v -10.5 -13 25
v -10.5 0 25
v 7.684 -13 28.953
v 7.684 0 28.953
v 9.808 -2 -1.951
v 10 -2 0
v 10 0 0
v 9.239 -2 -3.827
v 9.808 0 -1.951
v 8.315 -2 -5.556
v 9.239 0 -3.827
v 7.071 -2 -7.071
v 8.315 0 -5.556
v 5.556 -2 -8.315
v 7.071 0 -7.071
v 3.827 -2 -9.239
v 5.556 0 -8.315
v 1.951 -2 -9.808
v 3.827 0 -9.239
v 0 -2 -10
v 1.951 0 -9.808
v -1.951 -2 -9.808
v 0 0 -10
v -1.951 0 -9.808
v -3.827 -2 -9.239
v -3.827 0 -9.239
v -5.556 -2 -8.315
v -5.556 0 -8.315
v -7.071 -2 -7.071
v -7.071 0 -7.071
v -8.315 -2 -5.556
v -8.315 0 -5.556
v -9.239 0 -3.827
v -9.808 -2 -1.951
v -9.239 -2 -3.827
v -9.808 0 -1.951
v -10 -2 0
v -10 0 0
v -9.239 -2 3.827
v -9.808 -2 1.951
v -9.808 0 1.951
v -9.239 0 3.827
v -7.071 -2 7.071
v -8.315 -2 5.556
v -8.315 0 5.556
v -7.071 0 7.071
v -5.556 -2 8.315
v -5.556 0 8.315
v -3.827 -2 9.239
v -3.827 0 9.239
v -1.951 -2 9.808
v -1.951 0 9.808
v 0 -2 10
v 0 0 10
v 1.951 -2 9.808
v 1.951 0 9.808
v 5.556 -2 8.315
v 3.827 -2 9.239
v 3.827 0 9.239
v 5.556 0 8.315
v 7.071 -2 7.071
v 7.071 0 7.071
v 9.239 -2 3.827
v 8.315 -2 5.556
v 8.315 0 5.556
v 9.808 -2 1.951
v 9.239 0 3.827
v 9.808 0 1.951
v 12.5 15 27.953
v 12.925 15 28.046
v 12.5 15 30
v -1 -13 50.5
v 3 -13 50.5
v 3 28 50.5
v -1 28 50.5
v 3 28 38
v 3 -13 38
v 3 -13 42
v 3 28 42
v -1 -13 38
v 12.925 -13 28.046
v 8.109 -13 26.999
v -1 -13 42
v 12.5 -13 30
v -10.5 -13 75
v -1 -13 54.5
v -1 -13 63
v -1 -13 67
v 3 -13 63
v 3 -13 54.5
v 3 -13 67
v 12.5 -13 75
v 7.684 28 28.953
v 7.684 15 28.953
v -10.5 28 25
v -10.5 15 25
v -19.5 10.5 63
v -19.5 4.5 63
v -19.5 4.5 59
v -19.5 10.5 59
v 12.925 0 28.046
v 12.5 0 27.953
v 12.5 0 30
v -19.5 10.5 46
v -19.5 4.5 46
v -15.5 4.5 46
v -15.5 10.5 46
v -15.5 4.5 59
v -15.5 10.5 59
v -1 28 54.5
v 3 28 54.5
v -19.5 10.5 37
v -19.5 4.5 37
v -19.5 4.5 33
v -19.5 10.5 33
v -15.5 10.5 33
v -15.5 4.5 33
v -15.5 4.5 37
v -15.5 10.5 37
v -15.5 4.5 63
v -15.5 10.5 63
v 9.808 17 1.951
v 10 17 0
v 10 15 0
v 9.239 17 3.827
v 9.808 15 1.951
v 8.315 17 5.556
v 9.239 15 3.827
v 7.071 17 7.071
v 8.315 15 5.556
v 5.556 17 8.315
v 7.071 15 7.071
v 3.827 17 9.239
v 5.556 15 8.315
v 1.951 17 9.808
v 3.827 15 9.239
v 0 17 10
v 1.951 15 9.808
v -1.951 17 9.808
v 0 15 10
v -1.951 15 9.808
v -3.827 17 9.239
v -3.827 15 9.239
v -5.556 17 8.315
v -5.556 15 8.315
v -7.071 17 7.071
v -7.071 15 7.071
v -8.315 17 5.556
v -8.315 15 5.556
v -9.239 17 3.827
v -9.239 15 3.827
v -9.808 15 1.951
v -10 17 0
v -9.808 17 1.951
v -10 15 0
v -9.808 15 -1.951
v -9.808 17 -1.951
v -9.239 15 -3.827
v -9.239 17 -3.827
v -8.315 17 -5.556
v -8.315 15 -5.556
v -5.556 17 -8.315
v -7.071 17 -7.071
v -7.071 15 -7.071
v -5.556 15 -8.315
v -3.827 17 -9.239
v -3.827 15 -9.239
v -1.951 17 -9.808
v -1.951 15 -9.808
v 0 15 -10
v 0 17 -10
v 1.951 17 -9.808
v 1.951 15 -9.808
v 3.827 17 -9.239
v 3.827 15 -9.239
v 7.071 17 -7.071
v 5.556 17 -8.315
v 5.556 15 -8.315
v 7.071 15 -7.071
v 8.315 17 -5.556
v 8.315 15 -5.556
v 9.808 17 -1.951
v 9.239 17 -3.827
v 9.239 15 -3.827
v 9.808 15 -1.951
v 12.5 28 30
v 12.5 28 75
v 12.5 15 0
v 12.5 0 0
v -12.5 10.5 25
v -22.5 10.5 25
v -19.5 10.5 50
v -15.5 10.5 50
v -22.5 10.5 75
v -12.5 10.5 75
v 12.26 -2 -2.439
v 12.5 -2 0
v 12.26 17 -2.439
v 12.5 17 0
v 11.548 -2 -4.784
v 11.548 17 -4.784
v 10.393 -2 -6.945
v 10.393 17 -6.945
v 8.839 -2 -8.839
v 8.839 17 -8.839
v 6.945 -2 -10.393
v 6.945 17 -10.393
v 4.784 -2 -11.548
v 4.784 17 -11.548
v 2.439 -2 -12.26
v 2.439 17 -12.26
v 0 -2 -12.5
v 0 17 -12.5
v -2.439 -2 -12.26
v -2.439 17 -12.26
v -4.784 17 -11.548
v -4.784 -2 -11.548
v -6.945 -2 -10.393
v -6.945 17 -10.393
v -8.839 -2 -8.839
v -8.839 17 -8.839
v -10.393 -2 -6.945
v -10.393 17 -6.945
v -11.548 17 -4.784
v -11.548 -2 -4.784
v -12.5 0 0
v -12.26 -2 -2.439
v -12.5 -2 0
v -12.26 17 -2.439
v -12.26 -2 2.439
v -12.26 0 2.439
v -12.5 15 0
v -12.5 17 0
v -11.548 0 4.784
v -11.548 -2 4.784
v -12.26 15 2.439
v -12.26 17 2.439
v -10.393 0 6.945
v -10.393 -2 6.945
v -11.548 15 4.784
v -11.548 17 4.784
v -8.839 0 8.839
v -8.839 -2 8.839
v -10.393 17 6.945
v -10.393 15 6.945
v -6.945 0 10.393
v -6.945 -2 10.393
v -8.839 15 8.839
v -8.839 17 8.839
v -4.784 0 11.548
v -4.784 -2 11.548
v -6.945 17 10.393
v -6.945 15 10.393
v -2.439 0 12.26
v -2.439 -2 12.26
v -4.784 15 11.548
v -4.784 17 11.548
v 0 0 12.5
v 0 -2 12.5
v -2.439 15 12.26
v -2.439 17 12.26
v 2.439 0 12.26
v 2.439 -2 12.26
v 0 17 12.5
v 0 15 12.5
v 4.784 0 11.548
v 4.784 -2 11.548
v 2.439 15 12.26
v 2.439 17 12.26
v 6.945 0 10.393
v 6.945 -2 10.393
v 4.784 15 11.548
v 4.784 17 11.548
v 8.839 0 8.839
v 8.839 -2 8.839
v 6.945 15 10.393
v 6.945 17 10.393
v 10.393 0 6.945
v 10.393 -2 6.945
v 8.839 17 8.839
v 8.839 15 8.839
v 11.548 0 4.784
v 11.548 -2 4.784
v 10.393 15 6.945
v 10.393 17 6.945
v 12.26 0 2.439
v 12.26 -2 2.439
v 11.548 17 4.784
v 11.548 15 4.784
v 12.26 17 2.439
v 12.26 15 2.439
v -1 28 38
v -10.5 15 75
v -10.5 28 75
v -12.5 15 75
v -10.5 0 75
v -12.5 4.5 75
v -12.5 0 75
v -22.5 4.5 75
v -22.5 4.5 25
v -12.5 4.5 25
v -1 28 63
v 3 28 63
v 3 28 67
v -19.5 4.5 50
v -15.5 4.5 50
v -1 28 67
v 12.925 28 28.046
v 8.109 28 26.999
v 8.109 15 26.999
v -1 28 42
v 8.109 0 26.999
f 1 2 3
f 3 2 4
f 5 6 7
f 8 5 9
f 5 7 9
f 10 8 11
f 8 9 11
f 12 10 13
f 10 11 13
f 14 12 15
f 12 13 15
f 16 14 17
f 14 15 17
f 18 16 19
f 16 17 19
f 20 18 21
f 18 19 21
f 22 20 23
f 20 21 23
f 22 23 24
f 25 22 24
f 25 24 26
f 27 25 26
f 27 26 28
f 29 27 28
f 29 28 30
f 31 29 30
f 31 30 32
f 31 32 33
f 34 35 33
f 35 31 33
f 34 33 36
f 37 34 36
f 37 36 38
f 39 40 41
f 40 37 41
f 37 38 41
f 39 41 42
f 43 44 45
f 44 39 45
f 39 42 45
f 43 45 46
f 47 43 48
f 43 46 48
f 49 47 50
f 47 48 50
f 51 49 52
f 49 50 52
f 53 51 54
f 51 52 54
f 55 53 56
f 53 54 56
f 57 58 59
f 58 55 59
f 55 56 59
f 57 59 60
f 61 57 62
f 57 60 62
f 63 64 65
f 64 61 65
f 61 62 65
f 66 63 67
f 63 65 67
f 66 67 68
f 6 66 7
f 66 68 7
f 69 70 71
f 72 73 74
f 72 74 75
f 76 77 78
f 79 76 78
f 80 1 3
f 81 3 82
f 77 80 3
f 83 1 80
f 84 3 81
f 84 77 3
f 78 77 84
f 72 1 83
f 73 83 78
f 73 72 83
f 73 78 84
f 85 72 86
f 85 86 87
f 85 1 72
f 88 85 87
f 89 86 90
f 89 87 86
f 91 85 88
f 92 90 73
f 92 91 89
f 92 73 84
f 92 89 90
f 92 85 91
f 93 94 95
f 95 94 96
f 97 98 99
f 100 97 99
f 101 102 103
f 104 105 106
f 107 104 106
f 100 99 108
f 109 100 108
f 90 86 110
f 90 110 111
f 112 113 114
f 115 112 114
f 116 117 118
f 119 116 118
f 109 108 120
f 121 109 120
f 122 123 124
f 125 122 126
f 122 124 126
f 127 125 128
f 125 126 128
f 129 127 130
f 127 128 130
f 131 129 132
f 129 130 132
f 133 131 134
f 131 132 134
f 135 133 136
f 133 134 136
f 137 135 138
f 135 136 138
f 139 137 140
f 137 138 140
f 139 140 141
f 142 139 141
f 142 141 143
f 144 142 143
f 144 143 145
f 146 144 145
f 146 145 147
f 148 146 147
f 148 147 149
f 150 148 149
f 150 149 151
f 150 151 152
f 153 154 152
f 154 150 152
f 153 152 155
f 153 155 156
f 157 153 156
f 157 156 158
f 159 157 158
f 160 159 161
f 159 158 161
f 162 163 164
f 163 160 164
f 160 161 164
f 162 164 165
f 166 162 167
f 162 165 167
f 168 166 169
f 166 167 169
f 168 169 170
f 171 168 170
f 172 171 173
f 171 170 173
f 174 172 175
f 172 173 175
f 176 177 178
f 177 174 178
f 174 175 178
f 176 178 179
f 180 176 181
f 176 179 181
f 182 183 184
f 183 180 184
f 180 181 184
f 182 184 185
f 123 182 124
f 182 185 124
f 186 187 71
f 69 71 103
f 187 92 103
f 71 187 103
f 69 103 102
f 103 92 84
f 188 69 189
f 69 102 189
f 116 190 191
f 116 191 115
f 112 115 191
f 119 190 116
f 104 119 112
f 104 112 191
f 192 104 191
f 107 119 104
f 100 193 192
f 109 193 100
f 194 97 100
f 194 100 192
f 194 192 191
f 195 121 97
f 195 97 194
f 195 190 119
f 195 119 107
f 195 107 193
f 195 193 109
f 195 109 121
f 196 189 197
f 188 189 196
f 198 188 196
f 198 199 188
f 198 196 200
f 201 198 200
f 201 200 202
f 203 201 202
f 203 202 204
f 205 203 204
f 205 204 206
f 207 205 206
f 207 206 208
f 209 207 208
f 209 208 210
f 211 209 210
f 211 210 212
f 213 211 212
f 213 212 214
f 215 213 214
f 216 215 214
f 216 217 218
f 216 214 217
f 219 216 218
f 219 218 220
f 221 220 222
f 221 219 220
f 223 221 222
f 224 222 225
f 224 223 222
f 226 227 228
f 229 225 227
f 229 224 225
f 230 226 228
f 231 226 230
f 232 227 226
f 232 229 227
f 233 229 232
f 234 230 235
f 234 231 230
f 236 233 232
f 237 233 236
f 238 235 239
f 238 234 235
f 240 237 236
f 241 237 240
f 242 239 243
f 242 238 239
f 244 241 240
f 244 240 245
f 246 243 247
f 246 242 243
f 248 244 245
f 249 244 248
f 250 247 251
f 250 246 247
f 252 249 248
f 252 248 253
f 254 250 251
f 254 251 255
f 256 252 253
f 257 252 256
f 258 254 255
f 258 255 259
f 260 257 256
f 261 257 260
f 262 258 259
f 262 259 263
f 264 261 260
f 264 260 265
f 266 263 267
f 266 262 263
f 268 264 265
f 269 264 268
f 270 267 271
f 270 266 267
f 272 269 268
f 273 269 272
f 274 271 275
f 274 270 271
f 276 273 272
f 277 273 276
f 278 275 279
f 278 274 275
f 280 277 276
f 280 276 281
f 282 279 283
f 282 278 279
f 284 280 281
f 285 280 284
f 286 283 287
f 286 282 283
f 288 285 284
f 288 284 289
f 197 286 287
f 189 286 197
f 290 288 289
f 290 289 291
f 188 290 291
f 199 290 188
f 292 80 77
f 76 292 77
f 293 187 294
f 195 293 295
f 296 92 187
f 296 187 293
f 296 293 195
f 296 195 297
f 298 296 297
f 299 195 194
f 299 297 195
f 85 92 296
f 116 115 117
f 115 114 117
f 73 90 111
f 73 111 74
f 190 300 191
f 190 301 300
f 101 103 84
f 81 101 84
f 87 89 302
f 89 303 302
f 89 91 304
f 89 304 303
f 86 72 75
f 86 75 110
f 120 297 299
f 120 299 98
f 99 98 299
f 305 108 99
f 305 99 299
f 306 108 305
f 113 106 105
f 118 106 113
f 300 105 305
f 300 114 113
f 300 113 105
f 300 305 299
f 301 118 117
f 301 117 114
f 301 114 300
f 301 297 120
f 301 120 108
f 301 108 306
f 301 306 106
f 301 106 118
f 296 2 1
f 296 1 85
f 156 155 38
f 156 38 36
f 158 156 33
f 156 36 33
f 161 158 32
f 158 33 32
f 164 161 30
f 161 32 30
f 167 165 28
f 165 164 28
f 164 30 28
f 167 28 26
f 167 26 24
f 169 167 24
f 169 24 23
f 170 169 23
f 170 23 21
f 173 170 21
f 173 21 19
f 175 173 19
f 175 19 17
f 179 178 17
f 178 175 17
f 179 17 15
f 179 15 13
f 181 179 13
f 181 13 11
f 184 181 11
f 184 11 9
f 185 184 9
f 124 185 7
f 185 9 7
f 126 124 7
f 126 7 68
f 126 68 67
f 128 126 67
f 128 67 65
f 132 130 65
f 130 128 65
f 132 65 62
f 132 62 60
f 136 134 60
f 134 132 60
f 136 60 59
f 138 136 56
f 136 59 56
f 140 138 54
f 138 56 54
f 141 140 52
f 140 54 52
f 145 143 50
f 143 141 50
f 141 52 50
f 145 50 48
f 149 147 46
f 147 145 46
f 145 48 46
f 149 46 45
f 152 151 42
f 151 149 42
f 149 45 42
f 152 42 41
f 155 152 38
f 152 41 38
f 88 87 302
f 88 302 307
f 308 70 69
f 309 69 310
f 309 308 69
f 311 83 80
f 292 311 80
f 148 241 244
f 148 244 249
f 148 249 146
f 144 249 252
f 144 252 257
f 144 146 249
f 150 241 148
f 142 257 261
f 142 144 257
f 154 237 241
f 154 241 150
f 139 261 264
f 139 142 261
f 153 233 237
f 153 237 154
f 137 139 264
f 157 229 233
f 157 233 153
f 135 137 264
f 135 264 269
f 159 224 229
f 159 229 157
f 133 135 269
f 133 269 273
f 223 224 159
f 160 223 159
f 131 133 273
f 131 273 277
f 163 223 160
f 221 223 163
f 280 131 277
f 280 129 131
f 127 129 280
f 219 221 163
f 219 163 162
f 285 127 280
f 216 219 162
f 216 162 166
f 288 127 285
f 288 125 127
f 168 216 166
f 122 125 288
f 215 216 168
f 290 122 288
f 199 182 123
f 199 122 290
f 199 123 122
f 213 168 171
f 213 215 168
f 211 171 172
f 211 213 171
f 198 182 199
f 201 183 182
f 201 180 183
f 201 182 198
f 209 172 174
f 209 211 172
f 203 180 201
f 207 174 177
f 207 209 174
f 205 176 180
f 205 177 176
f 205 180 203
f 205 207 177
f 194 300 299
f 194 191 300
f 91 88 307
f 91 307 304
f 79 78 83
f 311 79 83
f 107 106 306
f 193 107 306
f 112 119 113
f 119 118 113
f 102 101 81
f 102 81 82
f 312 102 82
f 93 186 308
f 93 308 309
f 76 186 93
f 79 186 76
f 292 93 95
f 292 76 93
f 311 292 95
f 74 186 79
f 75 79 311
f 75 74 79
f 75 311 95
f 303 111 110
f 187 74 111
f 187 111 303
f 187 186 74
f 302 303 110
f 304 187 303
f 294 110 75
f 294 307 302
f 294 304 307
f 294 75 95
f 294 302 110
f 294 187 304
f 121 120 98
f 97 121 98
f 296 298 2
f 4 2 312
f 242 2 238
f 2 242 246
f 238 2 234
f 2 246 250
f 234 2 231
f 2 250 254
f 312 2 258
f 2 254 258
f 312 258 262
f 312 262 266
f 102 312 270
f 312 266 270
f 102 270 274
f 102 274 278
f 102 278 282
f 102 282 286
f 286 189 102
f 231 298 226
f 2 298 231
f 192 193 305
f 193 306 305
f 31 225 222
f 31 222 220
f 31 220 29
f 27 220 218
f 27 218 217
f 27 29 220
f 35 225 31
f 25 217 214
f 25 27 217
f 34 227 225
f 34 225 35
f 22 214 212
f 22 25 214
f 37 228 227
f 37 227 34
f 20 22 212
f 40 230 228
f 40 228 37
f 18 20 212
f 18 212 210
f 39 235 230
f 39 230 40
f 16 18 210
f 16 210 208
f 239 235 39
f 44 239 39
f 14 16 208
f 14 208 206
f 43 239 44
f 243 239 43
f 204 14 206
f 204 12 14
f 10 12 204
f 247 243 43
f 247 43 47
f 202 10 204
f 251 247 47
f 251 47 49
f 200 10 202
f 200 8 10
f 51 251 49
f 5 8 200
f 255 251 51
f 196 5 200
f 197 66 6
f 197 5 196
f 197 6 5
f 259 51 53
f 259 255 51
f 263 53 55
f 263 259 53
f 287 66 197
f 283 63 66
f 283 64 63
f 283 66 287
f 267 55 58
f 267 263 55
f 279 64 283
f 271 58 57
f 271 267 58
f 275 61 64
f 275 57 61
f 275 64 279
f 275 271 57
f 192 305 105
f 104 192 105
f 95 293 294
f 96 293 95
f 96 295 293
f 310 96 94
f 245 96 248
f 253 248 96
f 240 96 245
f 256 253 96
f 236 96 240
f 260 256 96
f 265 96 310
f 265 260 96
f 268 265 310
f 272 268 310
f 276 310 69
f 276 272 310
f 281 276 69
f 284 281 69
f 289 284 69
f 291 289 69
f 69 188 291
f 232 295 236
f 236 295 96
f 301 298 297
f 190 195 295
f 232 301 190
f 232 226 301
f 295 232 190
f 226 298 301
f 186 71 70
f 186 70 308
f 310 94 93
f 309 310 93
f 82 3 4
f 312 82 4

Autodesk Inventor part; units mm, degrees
ref_plane "YZ Plane" through (0, 0, 0) normal (1, 0, 0) x (0, 1, 0)
ref_plane "XY Plane" through (0, 0, 0) normal (0, 0, 1) x (1, 0, 0)
sketch "Sketch1" plane through (0, 0, 0) normal (0, 1, 0) x (-1, 0, 0)
  circle A0 centre (0, 0) radius 10
  circle A1 centre (0, 0) radius 12.5
  line L0 (12.5, 0) -> (12.5, 50)
  line L1 (-12.5, 0) -> (-12.5, 50)
  line L2 (-12.5, 50) -> (12.5, 50)
  dimension "d0" = 20
  dimension "d1" = 25
  dimension "d2" = 50
extrude "Extrusion1" add sketch "Sketch1" along normal blind 15
sketch "Sketch2" plane through (-12.5, 0, 0) normal (-1, 0, 0) x (0, 0, 1)
  line L0 (-12.5, 0) -> (-12.5, 15) projected
  line L1 (-12.5, 7.5) -> (37.5, 7.5)
  line L2 (25, 7.5) -> (25, 4.5)
  line L3 (25, 4.5) -> (25, 10.5)
  line L4 (25, 10.5) -> (75, 10.5)
  line L5 (75, 10.5) -> (75, 4.5)
  line L6 (75, 4.5) -> (25, 4.5)
  point P0 (0, 0)
  dimension "d5" = 50
  dimension "d8" = 3
  dimension "d9" = 6
  dimension "d10" = 50
extrude "Extrusion2" add sketch "Sketch2" along normal blind 10
sketch "Sketch3" plane through (-12.5, 0, 50) normal (0, 0, 1) x (1, 0, 0)
  point P0 (12.5, 0)
sketch "Sketch4" plane through (-12.5, 0, 50) normal (0, 0, 1) x (1, 0, 0)
  line L0 (25, 0) -> (25, 15) projected
  line L1 (25, 0) -> (25, 15)
  line L2 (0, 15) -> (25, 15) projected
  line L3 (25, 15) -> (0, 15)
  line L4 (0, 0) -> (0, 15) projected
  line L5 (0, 15) -> (0, 0)
  line L6 (0, 0) -> (25, 0) projected
  line L7 (0, 0) -> (25, 0)
  point P0 (12.5, 0)
extrude "Extrusion3" add sketch "Sketch4" along normal blind 25
sketch "Sketch5" plane through (-12.5, 4.5, 25) normal (0, -1, 0) x (1, 0, 0)
  point P0 (12.5, -25)
sketch "Sketch8" plane through (-12.5, 4.5, 25) normal (0, -1, 0) x (1, 0, 0)
  line L0 (0, 0) -> (-10, 0) projected
  line L1 (-5, 0) -> (-5, 50)
  line L2 (0, 50) -> (-10, 50) projected
  line L3 (-3, 12) -> (-7, 12)
  line L4 (-7, 12) -> (-7, 8)
  line L5 (-7, 8) -> (-3, 8)
  line L6 (-3, 8) -> (-3, 12)
  line L7 (-3, 12) -> (-7, 8) construction
  line L8 (-7, 12) -> (-3, 8) construction
  line L9 (-5, 10) -> (-5, 23)
  line L10 (-7, 21) -> (-3, 21)
  line L11 (-3, 21) -> (-3, 25)
  line L12 (-3, 25) -> (-7, 25)
  line L13 (-7, 25) -> (-7, 21)
  line L14 (-7, 21) -> (-3, 25) construction
  line L15 (-3, 21) -> (-7, 25) construction
  line L16 (-5, 23) -> (-5, 36)
  line L17 (-7, 34) -> (-3, 34)
  line L18 (-3, 34) -> (-3, 38)
  line L19 (-3, 38) -> (-7, 38)
  line L20 (-7, 38) -> (-7, 34)
  line L21 (-7, 34) -> (-3, 38) construction
  line L22 (-3, 34) -> (-7, 38) construction
  point P0 (12.5, -25)
  dimension "d40" = 4
  dimension "d41" = 4
  dimension "d42" = 13
  dimension "d43" = 4
  dimension "d44" = 4
  dimension "d45" = 13
  dimension "d46" = 4
  dimension "d47" = 4
extrude "Extrusion6" cut sketch "Sketch8" against normal blind 10
sketch "Sketch9" plane through (0, 0, 0) normal (0, -1, 0) x (1, 0, 0)
  line L0 (-12.5, 25) -> (-22.5, 25) projected
  line L1 (-12.5, 25) -> (12.5, 25)
  line L2 (12.5, 0) -> (12.5, 75) projected
  line L3 (-12.5, 25) -> (-12.5, 75) projected
  line L4 (-12.5, 25) -> (-12.5, 75)
  line L5 (-12.5, 75) -> (12.5, 75) projected
  line L6 (-12.5, 75) -> (12.5, 75)
  line L7 (12.5, 75) -> (12.5, 25)
  line L8 (12.5, 0) -> (12.5, 30)
  line L9 (-12.5, 25) -> (-10.5, 25)
  line L10 (-10.5, 25) -> (-10.5, 75)
  line L11 (-12.5, 75) -> (-12.5, 25)
  line L12 (-10.5, 25) -> (12.5, 30)
  point P0 (0, 0)
  dimension "d50" = 30
  dimension "d51" = 2
extrude "Extrusion7" add sketch "Sketch9" along normal blind 13 contours L10 L5 L2 L12
sketch "Sketch10" plane through (0, -13, 0) normal (0, -1, 0) x (1, 0, 0)
  point P0 (0, 0)
sketch "Sketch11" plane through (0, -13, 0) normal (0, -1, 0) x (1, 0, 0)
  line L0 (-10.5, 25) -> (12.5, 30) projected
  line L1 (12.5, 30) -> (-10.5, 30)
  line L2 (-10.5, 25) -> (-10.5, 75) projected
  line L3 (-10.5, 30) -> (1, 30)
  line L4 (1, 30) -> (1, 75)
  line L5 (12.5, 75) -> (-12.5, 75) projected
  line L6 (-1, 42) -> (3, 42)
  line L7 (3, 42) -> (3, 38)
  line L8 (3, 38) -> (-1, 38)
  line L9 (-1, 38) -> (-1, 42)
  line L10 (-1, 42) -> (3, 38) construction
  line L11 (3, 42) -> (-1, 38) construction
  line L12 (1, 40) -> (1, 52.5)
  line L13 (-1, 50.5) -> (3, 50.5)
  line L14 (3, 50.5) -> (3, 54.5)
  line L15 (3, 54.5) -> (-1, 54.5)
  line L16 (-1, 54.5) -> (-1, 50.5)
  line L17 (-1, 50.5) -> (3, 54.5) construction
  line L18 (3, 50.5) -> (-1, 54.5) construction
  line L19 (1, 52.5) -> (1, 65)
  line L20 (-1, 63) -> (3, 63)
  line L21 (3, 63) -> (3, 67)
  line L22 (3, 67) -> (-1, 67)
  line L23 (-1, 67) -> (-1, 63)
  line L24 (-1, 63) -> (3, 67) construction
  line L25 (3, 63) -> (-1, 67) construction
  line L26 (-1, 38) -> (-1, 42)
  line L27 (-1, 38) -> (3, 38)
  line L28 (3, 38) -> (3, 42)
  line L29 (3, 42) -> (-1, 42)
  line L30 (-1, 42) -> (-1, 38)
  line L31 (-1, 38) -> (3, 42) construction
  line L32 (3, 38) -> (-1, 42) construction
  point P0 (0, 0)
  dimension "d54" = 11.5
  dimension "d55" = 4
  dimension "d56" = 4
  dimension "d57" = 12.5
  dimension "d58" = 4
  dimension "d59" = 4
  dimension "d60" = 12.5
  dimension "d61" = 4
  dimension "d62" = 4
extrude "Extrusion8" cut sketch "Sketch11" against normal blind 50 contours L8 L9 L6 L4 | L4 L6 L7 L8 | L22 L21 L20 L4 | L4 L20 L23 L22 | L13 L16 L15 L4 | L4 L15 L14 L13
ref_plane "Work Plane1" through (0, 7.5, 0) normal (0, 1, 0) x (-1, 0, 0)
mirror "Mirror1" about plane through (0, 7.5, 0) normal (0, 1, 0) of "Extrusion7"
mirror "Mirror2" about plane through (0, 7.5, 0) normal (0, 1, 0) of "Extrusion8"
sketch "Sketch12" plane through (-22.5, 0, 0) normal (-1, 0, 0) x (0, 0, 1)
  point P0 (0, 0)
sketch "Sketch13" plane through (-12.5, 4.5, 25) normal (0, -1, 0) x (1, 0, 0)
  point P0 (12.5, -25)
sketch "Sketch14" plane through (-12.5, 4.5, 25) normal (0, -1, 0) x (1, 0, 0)
  point P0 (12.5, -25)
sketch "Sketch15" plane through (-10.5, 15, 25) normal (0.2124296, 0, -0.9771764) x (-0.9771764, 0, -0.2124296)
  line L0 (-23.5372, 0) -> (-23.5372, 13) projected
  line L1 (-14.7001, 13) -> (-18.6088, 13) projected
  line L2 (-23.5372, 0) -> (-18.5372, 0)
  line L3 (-18.5372, 0) -> (-18.5372, 13)
  line L4 (-18.5372, 13) -> (-23.5372, 13)
  line L5 (-23.5372, 13) -> (-23.5372, 0)
  line L6 (-23.5372, -28) -> (-33.0965, -28) projected
  line L7 (-18.6088, -28) -> (-18.6088, 13) projected
  line L8 (-23.5372, -28) -> (-18.6088, -28)
  line L9 (-18.6088, -28) -> (-18.6088, -15)
  line L10 (-18.6088, -15) -> (-23.5372, -15)
  line L11 (-23.5372, -15) -> (-23.5372, -28)
  point P0 (-4.9496, -15)
  point P1 (-18.6088, 0)
  dimension "d66" = 5
extrude "Extrusion9" add sketch "Sketch15" along normal blind 2 contours L0 L4 L7 L2 | L8 L11 L10 L7
sketch "Sketch16" plane through (0, 15, 0) normal (0, 1, 0) x (1, 0, 0)
  circle A0 centre (0, 0) radius 10
  circle A1 centre (0, 0) radius 12.5
  dimension "d69" = 25
extrude "Extrusion10" add sketch "Sketch16" along normal blind 2
sketch "Sketch17" plane through (0, 0, 0) normal (0, -1, 0) x (1, 0, 0)
  circle A0 centre (0, 0) radius 10
  circle A1 centre (0, 0) radius 10 projected
  circle A2 centre (0, 0) radius 12.5
extrude "Extrusion11" add sketch "Sketch17" along normal blind 2
properties part number "Part10copycopy"
